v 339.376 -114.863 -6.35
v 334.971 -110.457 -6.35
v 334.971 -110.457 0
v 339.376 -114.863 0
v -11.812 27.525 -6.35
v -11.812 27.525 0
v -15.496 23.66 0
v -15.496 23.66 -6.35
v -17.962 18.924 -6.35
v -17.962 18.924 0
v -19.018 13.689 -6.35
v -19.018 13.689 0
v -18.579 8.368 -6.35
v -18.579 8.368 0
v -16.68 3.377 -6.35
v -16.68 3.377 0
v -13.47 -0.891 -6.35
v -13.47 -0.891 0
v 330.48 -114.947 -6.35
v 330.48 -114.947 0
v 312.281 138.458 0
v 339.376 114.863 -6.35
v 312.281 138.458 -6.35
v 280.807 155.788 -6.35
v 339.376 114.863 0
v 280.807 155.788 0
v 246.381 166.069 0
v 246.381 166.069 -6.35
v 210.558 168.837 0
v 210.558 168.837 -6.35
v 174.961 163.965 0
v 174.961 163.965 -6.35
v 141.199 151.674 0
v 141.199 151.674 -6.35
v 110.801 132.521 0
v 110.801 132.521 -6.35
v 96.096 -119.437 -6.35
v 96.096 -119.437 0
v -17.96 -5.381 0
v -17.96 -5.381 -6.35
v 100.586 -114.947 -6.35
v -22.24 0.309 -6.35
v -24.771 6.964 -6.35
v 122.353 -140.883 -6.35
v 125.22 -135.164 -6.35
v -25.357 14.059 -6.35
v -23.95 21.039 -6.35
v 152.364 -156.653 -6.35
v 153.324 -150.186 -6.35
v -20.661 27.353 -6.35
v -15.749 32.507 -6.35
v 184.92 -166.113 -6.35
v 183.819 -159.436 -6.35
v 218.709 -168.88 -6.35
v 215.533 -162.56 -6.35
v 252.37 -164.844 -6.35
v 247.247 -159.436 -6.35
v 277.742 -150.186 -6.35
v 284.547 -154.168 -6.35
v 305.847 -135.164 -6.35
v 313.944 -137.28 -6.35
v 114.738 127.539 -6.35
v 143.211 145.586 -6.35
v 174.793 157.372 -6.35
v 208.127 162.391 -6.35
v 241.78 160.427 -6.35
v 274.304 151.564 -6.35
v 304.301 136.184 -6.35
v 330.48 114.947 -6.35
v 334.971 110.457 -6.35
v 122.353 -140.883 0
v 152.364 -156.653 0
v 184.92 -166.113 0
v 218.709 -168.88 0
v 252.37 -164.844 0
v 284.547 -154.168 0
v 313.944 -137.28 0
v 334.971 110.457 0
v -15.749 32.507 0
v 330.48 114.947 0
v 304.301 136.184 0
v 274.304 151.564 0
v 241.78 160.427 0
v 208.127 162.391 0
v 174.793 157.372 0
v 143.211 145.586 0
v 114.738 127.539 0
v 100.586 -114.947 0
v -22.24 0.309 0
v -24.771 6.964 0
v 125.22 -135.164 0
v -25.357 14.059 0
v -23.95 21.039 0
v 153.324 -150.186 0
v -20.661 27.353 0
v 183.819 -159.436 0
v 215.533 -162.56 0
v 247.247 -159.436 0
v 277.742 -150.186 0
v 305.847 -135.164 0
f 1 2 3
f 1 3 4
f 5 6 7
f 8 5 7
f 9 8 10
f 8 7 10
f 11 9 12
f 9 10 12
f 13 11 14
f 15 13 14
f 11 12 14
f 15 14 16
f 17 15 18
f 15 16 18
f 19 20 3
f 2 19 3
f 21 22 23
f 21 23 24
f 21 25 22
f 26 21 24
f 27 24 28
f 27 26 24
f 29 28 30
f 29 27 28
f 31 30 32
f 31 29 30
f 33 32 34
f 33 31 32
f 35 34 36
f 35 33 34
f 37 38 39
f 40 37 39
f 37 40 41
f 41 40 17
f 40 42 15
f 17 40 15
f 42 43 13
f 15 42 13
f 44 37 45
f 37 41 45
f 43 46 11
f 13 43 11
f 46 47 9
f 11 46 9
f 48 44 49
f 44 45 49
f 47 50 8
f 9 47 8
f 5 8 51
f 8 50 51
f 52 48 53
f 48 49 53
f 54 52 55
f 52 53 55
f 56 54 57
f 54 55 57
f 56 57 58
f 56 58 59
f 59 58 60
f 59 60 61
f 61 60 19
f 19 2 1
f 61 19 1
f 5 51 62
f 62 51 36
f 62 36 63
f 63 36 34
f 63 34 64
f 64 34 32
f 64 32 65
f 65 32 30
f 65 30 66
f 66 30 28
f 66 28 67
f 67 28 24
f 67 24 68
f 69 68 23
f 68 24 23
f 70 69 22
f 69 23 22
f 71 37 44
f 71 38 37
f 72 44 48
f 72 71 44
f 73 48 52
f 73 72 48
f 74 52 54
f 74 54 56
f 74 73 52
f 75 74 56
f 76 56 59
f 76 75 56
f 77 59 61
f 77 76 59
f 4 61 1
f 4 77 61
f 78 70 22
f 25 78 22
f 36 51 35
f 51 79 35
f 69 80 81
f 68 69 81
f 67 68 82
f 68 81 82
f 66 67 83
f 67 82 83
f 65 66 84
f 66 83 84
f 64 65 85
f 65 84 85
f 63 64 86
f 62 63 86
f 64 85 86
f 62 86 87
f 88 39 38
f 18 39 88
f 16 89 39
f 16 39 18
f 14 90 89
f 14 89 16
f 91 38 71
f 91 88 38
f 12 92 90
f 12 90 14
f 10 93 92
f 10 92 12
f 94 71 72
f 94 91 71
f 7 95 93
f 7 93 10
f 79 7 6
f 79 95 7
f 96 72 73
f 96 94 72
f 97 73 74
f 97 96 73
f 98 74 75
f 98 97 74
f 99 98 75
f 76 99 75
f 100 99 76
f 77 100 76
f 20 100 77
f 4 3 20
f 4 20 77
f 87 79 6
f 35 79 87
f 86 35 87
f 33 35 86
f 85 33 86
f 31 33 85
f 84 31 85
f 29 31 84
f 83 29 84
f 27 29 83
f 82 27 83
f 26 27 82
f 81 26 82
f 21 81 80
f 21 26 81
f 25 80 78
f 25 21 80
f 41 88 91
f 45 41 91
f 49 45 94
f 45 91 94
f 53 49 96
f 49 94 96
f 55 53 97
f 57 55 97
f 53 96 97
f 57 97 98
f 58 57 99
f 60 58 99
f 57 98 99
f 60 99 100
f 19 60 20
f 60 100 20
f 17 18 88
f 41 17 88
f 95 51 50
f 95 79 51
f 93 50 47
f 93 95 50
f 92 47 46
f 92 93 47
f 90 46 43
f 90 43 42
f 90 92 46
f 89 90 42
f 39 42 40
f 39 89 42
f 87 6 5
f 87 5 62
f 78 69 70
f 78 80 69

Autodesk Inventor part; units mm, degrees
ref_plane "YZ Plane" through (0, 0, 0) normal (1, 0, 0) x (0, 1, 0)
ref_plane "XZ Plane" through (0, 0, 0) normal (0, 1, 0) x (-1, 0, 0)
ref_plane "XY Plane" through (0, 0, 0) normal (0, 0, 1) x (1, 0, 0)
sketch "Sketch1" plane through (0, 0, 0) normal (0, 0, 1) x (1, 0, 0)
  line L0 (-11.8119, 27.5254) -> (114.7385, 127.5389)
  line L1 (-13.4704, -0.891) -> (100.5859, -114.9473)
  arc A0 (100.5859, -114.9473) -> (330.4805, -114.9473) centre (215.5332, 0) ccw
  arc A1 (330.4805, 114.9473) -> (114.7385, 127.5389) centre (215.5332, 0) ccw
  line L2 (-15.7492, 32.5074) -> (110.8012, 132.5209)
  arc A2 (339.3763, 114.8628) -> (110.8012, 132.5209) centre (215.5332, 0) ccw
  arc A3 (96.0958, -119.4374) -> (339.3763, -114.8628) centre (215.5332, 0) ccw
  line L3 (96.0958, -119.4374) -> (-17.9605, -5.3811)
  arc A4 (-15.7492, 32.5074) -> (-17.9605, -5.3811) centre (0, 12.5794) ccw
  arc A5 (-11.8119, 27.5254) -> (-13.4704, -0.891) centre (0, 12.5794) ccw
  line L4 (330.4805, 114.9473) -> (334.9706, 110.4572)
  line L5 (330.4805, -114.9473) -> (334.9706, -110.4572)
  line L6 (334.9706, -110.4572) -> (339.3763, -114.8628)
  line L7 (334.9706, 110.4572) -> (339.3763, 114.8628)
  point P0 (0, 0)
  dimension "d4" = 6.35
  dimension "d5" = 6.35
extrude "Extrusion1" add sketch "Sketch1" against normal blind 6.35
properties part number "neck chain"
